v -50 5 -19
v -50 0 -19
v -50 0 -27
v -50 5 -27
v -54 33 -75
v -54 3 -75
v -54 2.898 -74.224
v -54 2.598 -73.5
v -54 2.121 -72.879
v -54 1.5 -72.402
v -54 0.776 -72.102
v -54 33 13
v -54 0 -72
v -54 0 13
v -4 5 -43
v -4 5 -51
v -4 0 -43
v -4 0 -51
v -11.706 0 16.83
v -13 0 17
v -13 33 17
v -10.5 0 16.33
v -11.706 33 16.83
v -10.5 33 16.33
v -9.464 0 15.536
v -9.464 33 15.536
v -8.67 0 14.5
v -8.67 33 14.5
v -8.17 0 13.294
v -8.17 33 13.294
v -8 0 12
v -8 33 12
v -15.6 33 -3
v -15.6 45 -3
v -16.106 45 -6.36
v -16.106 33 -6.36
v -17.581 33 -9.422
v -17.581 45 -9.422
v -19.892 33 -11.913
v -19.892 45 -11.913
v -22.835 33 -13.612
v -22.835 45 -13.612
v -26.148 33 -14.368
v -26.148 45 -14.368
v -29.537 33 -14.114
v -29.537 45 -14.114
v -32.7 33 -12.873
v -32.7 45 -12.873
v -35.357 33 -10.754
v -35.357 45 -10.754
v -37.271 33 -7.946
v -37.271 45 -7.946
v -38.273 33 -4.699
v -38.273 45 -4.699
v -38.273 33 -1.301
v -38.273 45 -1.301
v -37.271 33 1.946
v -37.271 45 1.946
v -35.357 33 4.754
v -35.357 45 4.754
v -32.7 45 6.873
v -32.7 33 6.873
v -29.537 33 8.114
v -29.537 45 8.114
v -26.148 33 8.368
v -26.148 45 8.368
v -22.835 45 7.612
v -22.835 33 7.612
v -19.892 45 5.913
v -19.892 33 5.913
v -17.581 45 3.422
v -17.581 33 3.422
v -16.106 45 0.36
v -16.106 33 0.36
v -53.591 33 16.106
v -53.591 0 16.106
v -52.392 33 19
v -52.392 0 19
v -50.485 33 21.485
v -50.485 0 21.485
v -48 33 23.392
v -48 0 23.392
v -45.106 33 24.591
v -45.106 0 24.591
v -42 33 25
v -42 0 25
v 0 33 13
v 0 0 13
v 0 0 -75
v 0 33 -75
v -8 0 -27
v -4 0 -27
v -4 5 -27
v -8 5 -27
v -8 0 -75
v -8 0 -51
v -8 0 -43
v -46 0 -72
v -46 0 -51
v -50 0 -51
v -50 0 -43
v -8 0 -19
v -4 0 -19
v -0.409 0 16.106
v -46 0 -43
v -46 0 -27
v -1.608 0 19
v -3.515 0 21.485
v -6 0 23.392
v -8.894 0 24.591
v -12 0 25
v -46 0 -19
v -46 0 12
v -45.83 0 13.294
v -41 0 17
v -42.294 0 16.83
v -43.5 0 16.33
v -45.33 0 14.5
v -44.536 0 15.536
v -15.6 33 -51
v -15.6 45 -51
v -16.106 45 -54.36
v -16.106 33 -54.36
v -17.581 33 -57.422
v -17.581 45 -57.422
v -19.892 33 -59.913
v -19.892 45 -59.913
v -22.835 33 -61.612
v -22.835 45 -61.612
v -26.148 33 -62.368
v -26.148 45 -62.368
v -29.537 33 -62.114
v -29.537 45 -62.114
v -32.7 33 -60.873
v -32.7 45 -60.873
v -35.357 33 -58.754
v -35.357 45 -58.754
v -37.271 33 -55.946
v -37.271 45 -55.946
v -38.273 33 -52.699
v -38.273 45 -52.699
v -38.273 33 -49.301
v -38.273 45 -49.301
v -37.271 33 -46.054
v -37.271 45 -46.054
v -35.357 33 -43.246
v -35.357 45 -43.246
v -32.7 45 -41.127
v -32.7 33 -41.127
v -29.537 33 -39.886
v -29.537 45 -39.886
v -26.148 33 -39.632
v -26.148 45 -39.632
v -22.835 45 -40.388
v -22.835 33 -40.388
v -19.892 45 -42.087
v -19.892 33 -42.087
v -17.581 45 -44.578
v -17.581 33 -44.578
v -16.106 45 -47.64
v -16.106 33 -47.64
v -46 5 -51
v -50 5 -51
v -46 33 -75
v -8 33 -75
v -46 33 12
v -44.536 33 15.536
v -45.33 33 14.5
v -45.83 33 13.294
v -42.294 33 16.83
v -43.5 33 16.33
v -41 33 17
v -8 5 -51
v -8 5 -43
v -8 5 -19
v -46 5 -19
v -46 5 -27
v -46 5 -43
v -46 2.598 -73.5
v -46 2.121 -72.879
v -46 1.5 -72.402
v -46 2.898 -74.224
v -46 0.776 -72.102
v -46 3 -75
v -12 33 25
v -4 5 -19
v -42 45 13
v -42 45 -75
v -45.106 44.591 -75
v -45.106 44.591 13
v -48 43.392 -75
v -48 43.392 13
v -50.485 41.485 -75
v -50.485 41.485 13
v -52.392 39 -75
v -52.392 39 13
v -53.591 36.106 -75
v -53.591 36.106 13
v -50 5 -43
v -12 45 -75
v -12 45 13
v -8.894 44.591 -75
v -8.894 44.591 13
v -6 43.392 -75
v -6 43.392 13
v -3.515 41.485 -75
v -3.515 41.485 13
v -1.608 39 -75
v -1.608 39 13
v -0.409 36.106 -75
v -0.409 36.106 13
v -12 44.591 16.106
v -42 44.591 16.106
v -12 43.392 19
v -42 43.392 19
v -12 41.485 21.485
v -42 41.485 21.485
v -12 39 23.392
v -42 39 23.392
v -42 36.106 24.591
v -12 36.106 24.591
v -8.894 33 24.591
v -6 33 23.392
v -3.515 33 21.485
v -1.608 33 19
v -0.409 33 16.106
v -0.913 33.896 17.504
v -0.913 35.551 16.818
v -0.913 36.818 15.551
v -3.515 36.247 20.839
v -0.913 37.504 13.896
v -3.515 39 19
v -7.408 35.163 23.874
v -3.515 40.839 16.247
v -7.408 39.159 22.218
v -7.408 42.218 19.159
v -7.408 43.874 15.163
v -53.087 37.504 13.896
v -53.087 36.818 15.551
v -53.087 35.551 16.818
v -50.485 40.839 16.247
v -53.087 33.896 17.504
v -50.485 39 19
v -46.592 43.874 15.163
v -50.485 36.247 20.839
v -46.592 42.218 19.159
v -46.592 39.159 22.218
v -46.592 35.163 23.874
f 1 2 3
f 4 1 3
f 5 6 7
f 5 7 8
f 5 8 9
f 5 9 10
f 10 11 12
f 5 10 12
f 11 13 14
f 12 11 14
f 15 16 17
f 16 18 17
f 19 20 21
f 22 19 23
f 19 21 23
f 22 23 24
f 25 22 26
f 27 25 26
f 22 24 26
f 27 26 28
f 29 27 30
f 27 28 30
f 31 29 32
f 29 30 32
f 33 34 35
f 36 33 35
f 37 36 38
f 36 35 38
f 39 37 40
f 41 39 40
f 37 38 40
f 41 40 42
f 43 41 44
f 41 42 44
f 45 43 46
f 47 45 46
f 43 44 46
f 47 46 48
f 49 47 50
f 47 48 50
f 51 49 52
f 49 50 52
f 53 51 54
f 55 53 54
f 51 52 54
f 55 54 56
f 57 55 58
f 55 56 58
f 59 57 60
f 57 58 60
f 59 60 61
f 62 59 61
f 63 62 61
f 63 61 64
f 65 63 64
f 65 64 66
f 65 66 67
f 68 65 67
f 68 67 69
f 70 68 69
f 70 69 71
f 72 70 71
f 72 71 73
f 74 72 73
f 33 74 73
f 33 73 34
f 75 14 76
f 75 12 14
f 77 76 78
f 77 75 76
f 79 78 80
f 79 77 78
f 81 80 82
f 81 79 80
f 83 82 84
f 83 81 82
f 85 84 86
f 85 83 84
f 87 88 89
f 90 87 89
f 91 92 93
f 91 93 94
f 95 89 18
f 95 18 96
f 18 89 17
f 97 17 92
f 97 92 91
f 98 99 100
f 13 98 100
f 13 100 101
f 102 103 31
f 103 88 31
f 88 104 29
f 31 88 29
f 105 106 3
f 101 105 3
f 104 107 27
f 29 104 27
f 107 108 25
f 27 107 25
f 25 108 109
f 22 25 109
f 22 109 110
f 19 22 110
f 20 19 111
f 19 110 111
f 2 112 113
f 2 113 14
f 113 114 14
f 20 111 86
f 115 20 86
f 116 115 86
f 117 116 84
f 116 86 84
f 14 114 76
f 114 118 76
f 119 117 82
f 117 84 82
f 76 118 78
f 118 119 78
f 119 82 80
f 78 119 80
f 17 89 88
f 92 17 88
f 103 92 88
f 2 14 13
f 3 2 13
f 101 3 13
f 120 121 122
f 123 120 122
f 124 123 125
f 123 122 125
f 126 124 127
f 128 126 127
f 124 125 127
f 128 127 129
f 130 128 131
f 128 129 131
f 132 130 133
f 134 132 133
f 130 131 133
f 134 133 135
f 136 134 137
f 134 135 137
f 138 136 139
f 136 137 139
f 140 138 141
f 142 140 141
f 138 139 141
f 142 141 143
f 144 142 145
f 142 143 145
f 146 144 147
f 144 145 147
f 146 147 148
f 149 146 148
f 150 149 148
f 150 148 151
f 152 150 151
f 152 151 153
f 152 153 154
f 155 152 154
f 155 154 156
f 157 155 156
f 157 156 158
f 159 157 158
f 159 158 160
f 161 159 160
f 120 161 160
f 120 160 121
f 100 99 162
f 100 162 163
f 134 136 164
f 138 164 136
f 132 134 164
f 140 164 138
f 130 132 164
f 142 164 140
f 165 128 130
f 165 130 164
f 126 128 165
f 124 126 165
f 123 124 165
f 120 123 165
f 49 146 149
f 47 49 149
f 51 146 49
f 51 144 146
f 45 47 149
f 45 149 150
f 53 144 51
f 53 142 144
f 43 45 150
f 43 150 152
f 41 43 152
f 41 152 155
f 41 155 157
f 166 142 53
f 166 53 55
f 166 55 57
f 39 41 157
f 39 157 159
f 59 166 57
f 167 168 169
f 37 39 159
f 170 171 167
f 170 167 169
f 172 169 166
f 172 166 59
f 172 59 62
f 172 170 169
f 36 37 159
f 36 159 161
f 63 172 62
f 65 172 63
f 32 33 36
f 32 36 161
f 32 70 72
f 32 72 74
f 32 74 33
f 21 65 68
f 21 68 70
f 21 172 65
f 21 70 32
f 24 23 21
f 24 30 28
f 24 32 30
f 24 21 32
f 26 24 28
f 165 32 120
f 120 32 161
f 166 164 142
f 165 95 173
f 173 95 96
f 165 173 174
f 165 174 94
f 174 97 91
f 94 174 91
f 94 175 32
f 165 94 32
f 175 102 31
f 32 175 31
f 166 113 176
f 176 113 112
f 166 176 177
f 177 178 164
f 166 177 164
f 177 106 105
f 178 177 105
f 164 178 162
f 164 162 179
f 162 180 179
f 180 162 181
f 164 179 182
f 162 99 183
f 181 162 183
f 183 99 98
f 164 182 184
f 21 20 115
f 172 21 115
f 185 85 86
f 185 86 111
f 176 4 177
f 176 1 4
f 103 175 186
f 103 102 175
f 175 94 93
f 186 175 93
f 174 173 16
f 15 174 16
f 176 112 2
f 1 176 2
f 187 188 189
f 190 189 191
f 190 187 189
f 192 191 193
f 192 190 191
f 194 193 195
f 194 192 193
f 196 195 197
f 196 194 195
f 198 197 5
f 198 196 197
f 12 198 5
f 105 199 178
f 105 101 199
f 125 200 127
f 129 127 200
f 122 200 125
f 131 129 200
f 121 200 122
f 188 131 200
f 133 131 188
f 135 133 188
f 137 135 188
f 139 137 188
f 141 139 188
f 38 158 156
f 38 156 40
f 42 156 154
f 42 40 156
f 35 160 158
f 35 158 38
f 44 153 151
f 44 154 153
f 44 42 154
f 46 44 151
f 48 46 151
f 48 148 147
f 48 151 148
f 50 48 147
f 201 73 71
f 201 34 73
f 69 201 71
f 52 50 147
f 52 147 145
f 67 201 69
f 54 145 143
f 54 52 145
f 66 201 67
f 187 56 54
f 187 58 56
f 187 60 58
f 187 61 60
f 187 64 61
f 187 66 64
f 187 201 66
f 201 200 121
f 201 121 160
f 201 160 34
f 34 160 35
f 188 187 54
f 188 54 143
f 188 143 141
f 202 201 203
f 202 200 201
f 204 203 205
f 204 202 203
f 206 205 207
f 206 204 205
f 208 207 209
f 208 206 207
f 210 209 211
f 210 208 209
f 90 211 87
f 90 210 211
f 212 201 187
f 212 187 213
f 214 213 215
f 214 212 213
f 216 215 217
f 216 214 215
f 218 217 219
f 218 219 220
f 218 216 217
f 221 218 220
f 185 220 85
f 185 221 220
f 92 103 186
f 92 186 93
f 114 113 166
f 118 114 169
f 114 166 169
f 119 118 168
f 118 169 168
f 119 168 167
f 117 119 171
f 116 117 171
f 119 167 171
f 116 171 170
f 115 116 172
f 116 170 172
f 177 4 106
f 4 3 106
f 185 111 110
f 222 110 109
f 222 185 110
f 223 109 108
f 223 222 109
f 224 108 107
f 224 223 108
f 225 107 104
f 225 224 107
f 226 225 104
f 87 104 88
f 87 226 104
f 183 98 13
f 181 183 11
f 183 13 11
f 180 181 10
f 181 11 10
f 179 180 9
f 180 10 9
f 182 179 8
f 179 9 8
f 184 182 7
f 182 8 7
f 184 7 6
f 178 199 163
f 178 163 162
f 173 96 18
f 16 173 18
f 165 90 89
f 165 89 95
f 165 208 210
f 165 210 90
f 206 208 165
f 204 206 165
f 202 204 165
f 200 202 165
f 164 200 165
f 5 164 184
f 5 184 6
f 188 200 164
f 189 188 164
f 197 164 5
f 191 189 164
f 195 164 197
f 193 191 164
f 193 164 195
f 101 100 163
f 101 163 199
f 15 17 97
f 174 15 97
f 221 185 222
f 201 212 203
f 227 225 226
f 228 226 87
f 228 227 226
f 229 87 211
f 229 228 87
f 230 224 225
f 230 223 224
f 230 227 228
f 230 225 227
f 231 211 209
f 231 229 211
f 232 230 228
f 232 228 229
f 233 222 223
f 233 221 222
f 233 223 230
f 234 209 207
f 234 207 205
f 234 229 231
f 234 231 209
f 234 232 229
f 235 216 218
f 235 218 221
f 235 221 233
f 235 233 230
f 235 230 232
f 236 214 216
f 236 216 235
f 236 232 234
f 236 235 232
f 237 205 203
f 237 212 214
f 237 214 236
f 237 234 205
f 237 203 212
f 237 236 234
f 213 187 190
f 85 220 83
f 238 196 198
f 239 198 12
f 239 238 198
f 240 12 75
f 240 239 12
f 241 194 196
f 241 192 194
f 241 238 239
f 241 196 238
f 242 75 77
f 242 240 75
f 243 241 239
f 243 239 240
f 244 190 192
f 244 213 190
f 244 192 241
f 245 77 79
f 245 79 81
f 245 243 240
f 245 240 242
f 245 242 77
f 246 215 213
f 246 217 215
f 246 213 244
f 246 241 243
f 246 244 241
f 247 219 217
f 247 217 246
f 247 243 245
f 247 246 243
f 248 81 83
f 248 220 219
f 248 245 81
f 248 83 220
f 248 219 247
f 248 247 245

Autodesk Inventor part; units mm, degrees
ref_plane "YZ Plane" through (0, 0, 0) normal (1, 0, 0) x (0, 1, 0)
ref_plane "XZ Plane" through (0, 0, 0) normal (0, 1, 0) x (-1, 0, 0)
ref_plane "XY Plane" through (0, 0, 0) normal (0, 0, 1) x (1, 0, 0)
sketch "Base" plane through (0, 0, 0) normal (0, 1, 0) x (-1, 0, 0)
  line L0 (0, 25) -> (0, -175)
  line L1 (0, -175) -> (54, -175)
  line L2 (54, -175) -> (54, 25)
  line L3 (54, 25) -> (0, 25)
  dimension "d6" = 200
  dimension "d7" = 54
extrude "Extrusion2" add sketch "Base" along normal blind 45
sketch "Top" plane through (0, 45, 0) normal (0, 1, 0) x (1, 0, 0)
  circle A0 centre (-27, 51) radius 14.25
  circle A1 centre (-27, 3) radius 14.25
  circle A2 centre (-27, 99) radius 14.25
  circle A3 centre (-27, 147) radius 14.25
  line L0 (0, 175) -> (-54, 175) projected
  line L1 (-54, 175) -> (-54, -25) projected
  line L2 (-54, -25) -> (0, -25) construction
  line L3 (-27, -25) -> (-27, 175) construction
  circle A4 centre (-27, 3) radius 11.4
  circle A5 centre (-27, 51) radius 11.4
  circle A6 centre (-27, 99) radius 11.4
  circle A7 centre (-27, 147) radius 11.4
  point P0 (-27, 75)
  dimension "d10" = 28.5
  dimension "d11" = 28.5
  dimension "d12" = 28.5
  dimension "d13" = 28.5
  dimension "d14" = 48
  dimension "d15" = 48
  dimension "d16" = 48
  dimension "d27" = 22.8
  dimension "d28" = 22.8
  dimension "d29" = 22.8
  dimension "d30" = 22.8
  dimension "d31" = 24
  dimension "d32" = 100
  dimension "d35" = 28
extrude "Extrusion3" cut sketch "Top" against normal up to next contours A4 | A5 | A6 | A7
sketch "Walls" plane through (0, 0, 0) normal (0, -1, 0) x (1, 0, 0)
  line L0 (-8, 17) -> (-46, 17)
  line L1 (-46, 17) -> (-46, -167)
  line L2 (-46, -167) -> (-8, -167)
  line L3 (-8, -167) -> (-8, 17)
  line L4 (-54, 25) -> (0, 25) projected
  line L5 (0, -175) -> (-54, -175) projected
  line L6 (0, 25) -> (0, -175) projected
  line L7 (-54, -175) -> (-54, 25) projected
  point P0 (0, 0)
  dimension "d21" = 8
  dimension "d22" = 8
  dimension "d23" = 8
  dimension "d24" = 8
  dimension "d33" = 38
extrude "Extrusion4" cut sketch "Walls" against normal blind 33 contours L3 L2 L1 L0
fillet "Fillet1" radius 12 8 edges at (-27, 45, 25) (-54, 45, -75) (0, 45, -75) (0, 22.5, 25) (-54, 22.5, 25) (0, 22.5, -175) (-27, 45, -175) (-54, 22.5, -175)
sketch "Sketch7" plane through (-54, 0, -163) normal (-1, 0, 0) x (0, 0, 1)
  line L0 (0, 33) -> (176, 33) projected
  line L1 (0, 0) -> (176, 0) projected
  circle A0 centre (88, 0) radius 3
  point P0 (163, 0)
  dimension "d40" = 6
extrude "Extrusion5" cut sketch "Sketch7" against normal up to surface (8 mm away)
fillet "Fillet2" radius 5 4 edges at (-8, 16.5, 17) (-46, 16.5, 17) (-8, 16.5, -167) (-46, 16.5, -167)
sketch "Sketch10" plane through (-12, 0, -175) normal (0, 0, -1) x (-1, 0, 0)
  line L0 (83.179, 90.3723) -> (-24.5359, 90.3723)
  line L1 (-24.5359, 90.3723) -> (-24.5359, -32.2986)
  line L2 (-24.5359, -32.2986) -> (83.179, -32.2986)
  line L3 (83.179, -32.2986) -> (83.179, 90.3723)
  point P0 (-12, 0)
extrude "Half" cut sketch "Sketch10" against normal blind 100
sketch "Sketch13" plane through (0, 0, 0) normal (0, -1, 0) x (1, 0, 0)
  line L0 (-8, 12) -> (-8, -75) projected
  line L1 (-8, -51) -> (-4, -51)
  line L2 (-4, -51) -> (-4, -43)
  line L3 (-4, -43) -> (-8, -43)
  line L4 (-8, -43) -> (-8, -51)
  circle A0 centre (-27, -51) radius 11.4 construction
  line L5 (0, 13) -> (0, -75) construction
  line L6 (0, -35) -> (-53.8786, -35) construction
  circle A1 centre (-27, -3) radius 11.4 construction
  line L7 (-8, -82) -> (-8, 5)
  line L8 (-8, -19) -> (-4, -19)
  line L9 (-4, -19) -> (-4, -27)
  line L10 (-4, -27) -> (-8, -27)
  line L11 (-8, -27) -> (-8, -19)
  line L12 (-27, -51) -> (-27, -3) construction
  line L13 (-46, -51) -> (-50, -51)
  line L14 (-50, -51) -> (-50, -43)
  line L15 (-50, -43) -> (-46, -43)
  line L16 (-46, -43) -> (-46, -51)
  line L17 (-46, -19) -> (-50, -19)
  line L18 (-46, -27) -> (-46, -19)
  line L19 (-50, -19) -> (-50, -27)
  line L20 (-50, -27) -> (-46, -27)
  point P0 (0, 0)
  point P1 (-8, -19)
  point P2 (-8, -27)
  point P3 (-8, -43)
  dimension "d50" = 4
  dimension "d52" = 8
  dimension "d53" = 0
  dimension "d54" = 8
extrude "Extrusion7" cut sketch "Sketch13" against normal blind 5
equation "\"d11\" = d10"
equation "\"d12\" = d10"
equation "\"d13\" = d10"
equation "\"d15\" = d14"
equation "\"d16\" = d14"
equation "\"d28\" = d27"
equation "\"d29\" = d27"
equation "\"d30\" = d27"
equation "\"d31\" = 0.5 * d14"
equation "\"d32\" = 0.5 * d6"
equation "\"d22\" = d21"
equation "\"d23\" = d21"
equation "\"d24\" = d23"
properties part number "_3DPrint"
